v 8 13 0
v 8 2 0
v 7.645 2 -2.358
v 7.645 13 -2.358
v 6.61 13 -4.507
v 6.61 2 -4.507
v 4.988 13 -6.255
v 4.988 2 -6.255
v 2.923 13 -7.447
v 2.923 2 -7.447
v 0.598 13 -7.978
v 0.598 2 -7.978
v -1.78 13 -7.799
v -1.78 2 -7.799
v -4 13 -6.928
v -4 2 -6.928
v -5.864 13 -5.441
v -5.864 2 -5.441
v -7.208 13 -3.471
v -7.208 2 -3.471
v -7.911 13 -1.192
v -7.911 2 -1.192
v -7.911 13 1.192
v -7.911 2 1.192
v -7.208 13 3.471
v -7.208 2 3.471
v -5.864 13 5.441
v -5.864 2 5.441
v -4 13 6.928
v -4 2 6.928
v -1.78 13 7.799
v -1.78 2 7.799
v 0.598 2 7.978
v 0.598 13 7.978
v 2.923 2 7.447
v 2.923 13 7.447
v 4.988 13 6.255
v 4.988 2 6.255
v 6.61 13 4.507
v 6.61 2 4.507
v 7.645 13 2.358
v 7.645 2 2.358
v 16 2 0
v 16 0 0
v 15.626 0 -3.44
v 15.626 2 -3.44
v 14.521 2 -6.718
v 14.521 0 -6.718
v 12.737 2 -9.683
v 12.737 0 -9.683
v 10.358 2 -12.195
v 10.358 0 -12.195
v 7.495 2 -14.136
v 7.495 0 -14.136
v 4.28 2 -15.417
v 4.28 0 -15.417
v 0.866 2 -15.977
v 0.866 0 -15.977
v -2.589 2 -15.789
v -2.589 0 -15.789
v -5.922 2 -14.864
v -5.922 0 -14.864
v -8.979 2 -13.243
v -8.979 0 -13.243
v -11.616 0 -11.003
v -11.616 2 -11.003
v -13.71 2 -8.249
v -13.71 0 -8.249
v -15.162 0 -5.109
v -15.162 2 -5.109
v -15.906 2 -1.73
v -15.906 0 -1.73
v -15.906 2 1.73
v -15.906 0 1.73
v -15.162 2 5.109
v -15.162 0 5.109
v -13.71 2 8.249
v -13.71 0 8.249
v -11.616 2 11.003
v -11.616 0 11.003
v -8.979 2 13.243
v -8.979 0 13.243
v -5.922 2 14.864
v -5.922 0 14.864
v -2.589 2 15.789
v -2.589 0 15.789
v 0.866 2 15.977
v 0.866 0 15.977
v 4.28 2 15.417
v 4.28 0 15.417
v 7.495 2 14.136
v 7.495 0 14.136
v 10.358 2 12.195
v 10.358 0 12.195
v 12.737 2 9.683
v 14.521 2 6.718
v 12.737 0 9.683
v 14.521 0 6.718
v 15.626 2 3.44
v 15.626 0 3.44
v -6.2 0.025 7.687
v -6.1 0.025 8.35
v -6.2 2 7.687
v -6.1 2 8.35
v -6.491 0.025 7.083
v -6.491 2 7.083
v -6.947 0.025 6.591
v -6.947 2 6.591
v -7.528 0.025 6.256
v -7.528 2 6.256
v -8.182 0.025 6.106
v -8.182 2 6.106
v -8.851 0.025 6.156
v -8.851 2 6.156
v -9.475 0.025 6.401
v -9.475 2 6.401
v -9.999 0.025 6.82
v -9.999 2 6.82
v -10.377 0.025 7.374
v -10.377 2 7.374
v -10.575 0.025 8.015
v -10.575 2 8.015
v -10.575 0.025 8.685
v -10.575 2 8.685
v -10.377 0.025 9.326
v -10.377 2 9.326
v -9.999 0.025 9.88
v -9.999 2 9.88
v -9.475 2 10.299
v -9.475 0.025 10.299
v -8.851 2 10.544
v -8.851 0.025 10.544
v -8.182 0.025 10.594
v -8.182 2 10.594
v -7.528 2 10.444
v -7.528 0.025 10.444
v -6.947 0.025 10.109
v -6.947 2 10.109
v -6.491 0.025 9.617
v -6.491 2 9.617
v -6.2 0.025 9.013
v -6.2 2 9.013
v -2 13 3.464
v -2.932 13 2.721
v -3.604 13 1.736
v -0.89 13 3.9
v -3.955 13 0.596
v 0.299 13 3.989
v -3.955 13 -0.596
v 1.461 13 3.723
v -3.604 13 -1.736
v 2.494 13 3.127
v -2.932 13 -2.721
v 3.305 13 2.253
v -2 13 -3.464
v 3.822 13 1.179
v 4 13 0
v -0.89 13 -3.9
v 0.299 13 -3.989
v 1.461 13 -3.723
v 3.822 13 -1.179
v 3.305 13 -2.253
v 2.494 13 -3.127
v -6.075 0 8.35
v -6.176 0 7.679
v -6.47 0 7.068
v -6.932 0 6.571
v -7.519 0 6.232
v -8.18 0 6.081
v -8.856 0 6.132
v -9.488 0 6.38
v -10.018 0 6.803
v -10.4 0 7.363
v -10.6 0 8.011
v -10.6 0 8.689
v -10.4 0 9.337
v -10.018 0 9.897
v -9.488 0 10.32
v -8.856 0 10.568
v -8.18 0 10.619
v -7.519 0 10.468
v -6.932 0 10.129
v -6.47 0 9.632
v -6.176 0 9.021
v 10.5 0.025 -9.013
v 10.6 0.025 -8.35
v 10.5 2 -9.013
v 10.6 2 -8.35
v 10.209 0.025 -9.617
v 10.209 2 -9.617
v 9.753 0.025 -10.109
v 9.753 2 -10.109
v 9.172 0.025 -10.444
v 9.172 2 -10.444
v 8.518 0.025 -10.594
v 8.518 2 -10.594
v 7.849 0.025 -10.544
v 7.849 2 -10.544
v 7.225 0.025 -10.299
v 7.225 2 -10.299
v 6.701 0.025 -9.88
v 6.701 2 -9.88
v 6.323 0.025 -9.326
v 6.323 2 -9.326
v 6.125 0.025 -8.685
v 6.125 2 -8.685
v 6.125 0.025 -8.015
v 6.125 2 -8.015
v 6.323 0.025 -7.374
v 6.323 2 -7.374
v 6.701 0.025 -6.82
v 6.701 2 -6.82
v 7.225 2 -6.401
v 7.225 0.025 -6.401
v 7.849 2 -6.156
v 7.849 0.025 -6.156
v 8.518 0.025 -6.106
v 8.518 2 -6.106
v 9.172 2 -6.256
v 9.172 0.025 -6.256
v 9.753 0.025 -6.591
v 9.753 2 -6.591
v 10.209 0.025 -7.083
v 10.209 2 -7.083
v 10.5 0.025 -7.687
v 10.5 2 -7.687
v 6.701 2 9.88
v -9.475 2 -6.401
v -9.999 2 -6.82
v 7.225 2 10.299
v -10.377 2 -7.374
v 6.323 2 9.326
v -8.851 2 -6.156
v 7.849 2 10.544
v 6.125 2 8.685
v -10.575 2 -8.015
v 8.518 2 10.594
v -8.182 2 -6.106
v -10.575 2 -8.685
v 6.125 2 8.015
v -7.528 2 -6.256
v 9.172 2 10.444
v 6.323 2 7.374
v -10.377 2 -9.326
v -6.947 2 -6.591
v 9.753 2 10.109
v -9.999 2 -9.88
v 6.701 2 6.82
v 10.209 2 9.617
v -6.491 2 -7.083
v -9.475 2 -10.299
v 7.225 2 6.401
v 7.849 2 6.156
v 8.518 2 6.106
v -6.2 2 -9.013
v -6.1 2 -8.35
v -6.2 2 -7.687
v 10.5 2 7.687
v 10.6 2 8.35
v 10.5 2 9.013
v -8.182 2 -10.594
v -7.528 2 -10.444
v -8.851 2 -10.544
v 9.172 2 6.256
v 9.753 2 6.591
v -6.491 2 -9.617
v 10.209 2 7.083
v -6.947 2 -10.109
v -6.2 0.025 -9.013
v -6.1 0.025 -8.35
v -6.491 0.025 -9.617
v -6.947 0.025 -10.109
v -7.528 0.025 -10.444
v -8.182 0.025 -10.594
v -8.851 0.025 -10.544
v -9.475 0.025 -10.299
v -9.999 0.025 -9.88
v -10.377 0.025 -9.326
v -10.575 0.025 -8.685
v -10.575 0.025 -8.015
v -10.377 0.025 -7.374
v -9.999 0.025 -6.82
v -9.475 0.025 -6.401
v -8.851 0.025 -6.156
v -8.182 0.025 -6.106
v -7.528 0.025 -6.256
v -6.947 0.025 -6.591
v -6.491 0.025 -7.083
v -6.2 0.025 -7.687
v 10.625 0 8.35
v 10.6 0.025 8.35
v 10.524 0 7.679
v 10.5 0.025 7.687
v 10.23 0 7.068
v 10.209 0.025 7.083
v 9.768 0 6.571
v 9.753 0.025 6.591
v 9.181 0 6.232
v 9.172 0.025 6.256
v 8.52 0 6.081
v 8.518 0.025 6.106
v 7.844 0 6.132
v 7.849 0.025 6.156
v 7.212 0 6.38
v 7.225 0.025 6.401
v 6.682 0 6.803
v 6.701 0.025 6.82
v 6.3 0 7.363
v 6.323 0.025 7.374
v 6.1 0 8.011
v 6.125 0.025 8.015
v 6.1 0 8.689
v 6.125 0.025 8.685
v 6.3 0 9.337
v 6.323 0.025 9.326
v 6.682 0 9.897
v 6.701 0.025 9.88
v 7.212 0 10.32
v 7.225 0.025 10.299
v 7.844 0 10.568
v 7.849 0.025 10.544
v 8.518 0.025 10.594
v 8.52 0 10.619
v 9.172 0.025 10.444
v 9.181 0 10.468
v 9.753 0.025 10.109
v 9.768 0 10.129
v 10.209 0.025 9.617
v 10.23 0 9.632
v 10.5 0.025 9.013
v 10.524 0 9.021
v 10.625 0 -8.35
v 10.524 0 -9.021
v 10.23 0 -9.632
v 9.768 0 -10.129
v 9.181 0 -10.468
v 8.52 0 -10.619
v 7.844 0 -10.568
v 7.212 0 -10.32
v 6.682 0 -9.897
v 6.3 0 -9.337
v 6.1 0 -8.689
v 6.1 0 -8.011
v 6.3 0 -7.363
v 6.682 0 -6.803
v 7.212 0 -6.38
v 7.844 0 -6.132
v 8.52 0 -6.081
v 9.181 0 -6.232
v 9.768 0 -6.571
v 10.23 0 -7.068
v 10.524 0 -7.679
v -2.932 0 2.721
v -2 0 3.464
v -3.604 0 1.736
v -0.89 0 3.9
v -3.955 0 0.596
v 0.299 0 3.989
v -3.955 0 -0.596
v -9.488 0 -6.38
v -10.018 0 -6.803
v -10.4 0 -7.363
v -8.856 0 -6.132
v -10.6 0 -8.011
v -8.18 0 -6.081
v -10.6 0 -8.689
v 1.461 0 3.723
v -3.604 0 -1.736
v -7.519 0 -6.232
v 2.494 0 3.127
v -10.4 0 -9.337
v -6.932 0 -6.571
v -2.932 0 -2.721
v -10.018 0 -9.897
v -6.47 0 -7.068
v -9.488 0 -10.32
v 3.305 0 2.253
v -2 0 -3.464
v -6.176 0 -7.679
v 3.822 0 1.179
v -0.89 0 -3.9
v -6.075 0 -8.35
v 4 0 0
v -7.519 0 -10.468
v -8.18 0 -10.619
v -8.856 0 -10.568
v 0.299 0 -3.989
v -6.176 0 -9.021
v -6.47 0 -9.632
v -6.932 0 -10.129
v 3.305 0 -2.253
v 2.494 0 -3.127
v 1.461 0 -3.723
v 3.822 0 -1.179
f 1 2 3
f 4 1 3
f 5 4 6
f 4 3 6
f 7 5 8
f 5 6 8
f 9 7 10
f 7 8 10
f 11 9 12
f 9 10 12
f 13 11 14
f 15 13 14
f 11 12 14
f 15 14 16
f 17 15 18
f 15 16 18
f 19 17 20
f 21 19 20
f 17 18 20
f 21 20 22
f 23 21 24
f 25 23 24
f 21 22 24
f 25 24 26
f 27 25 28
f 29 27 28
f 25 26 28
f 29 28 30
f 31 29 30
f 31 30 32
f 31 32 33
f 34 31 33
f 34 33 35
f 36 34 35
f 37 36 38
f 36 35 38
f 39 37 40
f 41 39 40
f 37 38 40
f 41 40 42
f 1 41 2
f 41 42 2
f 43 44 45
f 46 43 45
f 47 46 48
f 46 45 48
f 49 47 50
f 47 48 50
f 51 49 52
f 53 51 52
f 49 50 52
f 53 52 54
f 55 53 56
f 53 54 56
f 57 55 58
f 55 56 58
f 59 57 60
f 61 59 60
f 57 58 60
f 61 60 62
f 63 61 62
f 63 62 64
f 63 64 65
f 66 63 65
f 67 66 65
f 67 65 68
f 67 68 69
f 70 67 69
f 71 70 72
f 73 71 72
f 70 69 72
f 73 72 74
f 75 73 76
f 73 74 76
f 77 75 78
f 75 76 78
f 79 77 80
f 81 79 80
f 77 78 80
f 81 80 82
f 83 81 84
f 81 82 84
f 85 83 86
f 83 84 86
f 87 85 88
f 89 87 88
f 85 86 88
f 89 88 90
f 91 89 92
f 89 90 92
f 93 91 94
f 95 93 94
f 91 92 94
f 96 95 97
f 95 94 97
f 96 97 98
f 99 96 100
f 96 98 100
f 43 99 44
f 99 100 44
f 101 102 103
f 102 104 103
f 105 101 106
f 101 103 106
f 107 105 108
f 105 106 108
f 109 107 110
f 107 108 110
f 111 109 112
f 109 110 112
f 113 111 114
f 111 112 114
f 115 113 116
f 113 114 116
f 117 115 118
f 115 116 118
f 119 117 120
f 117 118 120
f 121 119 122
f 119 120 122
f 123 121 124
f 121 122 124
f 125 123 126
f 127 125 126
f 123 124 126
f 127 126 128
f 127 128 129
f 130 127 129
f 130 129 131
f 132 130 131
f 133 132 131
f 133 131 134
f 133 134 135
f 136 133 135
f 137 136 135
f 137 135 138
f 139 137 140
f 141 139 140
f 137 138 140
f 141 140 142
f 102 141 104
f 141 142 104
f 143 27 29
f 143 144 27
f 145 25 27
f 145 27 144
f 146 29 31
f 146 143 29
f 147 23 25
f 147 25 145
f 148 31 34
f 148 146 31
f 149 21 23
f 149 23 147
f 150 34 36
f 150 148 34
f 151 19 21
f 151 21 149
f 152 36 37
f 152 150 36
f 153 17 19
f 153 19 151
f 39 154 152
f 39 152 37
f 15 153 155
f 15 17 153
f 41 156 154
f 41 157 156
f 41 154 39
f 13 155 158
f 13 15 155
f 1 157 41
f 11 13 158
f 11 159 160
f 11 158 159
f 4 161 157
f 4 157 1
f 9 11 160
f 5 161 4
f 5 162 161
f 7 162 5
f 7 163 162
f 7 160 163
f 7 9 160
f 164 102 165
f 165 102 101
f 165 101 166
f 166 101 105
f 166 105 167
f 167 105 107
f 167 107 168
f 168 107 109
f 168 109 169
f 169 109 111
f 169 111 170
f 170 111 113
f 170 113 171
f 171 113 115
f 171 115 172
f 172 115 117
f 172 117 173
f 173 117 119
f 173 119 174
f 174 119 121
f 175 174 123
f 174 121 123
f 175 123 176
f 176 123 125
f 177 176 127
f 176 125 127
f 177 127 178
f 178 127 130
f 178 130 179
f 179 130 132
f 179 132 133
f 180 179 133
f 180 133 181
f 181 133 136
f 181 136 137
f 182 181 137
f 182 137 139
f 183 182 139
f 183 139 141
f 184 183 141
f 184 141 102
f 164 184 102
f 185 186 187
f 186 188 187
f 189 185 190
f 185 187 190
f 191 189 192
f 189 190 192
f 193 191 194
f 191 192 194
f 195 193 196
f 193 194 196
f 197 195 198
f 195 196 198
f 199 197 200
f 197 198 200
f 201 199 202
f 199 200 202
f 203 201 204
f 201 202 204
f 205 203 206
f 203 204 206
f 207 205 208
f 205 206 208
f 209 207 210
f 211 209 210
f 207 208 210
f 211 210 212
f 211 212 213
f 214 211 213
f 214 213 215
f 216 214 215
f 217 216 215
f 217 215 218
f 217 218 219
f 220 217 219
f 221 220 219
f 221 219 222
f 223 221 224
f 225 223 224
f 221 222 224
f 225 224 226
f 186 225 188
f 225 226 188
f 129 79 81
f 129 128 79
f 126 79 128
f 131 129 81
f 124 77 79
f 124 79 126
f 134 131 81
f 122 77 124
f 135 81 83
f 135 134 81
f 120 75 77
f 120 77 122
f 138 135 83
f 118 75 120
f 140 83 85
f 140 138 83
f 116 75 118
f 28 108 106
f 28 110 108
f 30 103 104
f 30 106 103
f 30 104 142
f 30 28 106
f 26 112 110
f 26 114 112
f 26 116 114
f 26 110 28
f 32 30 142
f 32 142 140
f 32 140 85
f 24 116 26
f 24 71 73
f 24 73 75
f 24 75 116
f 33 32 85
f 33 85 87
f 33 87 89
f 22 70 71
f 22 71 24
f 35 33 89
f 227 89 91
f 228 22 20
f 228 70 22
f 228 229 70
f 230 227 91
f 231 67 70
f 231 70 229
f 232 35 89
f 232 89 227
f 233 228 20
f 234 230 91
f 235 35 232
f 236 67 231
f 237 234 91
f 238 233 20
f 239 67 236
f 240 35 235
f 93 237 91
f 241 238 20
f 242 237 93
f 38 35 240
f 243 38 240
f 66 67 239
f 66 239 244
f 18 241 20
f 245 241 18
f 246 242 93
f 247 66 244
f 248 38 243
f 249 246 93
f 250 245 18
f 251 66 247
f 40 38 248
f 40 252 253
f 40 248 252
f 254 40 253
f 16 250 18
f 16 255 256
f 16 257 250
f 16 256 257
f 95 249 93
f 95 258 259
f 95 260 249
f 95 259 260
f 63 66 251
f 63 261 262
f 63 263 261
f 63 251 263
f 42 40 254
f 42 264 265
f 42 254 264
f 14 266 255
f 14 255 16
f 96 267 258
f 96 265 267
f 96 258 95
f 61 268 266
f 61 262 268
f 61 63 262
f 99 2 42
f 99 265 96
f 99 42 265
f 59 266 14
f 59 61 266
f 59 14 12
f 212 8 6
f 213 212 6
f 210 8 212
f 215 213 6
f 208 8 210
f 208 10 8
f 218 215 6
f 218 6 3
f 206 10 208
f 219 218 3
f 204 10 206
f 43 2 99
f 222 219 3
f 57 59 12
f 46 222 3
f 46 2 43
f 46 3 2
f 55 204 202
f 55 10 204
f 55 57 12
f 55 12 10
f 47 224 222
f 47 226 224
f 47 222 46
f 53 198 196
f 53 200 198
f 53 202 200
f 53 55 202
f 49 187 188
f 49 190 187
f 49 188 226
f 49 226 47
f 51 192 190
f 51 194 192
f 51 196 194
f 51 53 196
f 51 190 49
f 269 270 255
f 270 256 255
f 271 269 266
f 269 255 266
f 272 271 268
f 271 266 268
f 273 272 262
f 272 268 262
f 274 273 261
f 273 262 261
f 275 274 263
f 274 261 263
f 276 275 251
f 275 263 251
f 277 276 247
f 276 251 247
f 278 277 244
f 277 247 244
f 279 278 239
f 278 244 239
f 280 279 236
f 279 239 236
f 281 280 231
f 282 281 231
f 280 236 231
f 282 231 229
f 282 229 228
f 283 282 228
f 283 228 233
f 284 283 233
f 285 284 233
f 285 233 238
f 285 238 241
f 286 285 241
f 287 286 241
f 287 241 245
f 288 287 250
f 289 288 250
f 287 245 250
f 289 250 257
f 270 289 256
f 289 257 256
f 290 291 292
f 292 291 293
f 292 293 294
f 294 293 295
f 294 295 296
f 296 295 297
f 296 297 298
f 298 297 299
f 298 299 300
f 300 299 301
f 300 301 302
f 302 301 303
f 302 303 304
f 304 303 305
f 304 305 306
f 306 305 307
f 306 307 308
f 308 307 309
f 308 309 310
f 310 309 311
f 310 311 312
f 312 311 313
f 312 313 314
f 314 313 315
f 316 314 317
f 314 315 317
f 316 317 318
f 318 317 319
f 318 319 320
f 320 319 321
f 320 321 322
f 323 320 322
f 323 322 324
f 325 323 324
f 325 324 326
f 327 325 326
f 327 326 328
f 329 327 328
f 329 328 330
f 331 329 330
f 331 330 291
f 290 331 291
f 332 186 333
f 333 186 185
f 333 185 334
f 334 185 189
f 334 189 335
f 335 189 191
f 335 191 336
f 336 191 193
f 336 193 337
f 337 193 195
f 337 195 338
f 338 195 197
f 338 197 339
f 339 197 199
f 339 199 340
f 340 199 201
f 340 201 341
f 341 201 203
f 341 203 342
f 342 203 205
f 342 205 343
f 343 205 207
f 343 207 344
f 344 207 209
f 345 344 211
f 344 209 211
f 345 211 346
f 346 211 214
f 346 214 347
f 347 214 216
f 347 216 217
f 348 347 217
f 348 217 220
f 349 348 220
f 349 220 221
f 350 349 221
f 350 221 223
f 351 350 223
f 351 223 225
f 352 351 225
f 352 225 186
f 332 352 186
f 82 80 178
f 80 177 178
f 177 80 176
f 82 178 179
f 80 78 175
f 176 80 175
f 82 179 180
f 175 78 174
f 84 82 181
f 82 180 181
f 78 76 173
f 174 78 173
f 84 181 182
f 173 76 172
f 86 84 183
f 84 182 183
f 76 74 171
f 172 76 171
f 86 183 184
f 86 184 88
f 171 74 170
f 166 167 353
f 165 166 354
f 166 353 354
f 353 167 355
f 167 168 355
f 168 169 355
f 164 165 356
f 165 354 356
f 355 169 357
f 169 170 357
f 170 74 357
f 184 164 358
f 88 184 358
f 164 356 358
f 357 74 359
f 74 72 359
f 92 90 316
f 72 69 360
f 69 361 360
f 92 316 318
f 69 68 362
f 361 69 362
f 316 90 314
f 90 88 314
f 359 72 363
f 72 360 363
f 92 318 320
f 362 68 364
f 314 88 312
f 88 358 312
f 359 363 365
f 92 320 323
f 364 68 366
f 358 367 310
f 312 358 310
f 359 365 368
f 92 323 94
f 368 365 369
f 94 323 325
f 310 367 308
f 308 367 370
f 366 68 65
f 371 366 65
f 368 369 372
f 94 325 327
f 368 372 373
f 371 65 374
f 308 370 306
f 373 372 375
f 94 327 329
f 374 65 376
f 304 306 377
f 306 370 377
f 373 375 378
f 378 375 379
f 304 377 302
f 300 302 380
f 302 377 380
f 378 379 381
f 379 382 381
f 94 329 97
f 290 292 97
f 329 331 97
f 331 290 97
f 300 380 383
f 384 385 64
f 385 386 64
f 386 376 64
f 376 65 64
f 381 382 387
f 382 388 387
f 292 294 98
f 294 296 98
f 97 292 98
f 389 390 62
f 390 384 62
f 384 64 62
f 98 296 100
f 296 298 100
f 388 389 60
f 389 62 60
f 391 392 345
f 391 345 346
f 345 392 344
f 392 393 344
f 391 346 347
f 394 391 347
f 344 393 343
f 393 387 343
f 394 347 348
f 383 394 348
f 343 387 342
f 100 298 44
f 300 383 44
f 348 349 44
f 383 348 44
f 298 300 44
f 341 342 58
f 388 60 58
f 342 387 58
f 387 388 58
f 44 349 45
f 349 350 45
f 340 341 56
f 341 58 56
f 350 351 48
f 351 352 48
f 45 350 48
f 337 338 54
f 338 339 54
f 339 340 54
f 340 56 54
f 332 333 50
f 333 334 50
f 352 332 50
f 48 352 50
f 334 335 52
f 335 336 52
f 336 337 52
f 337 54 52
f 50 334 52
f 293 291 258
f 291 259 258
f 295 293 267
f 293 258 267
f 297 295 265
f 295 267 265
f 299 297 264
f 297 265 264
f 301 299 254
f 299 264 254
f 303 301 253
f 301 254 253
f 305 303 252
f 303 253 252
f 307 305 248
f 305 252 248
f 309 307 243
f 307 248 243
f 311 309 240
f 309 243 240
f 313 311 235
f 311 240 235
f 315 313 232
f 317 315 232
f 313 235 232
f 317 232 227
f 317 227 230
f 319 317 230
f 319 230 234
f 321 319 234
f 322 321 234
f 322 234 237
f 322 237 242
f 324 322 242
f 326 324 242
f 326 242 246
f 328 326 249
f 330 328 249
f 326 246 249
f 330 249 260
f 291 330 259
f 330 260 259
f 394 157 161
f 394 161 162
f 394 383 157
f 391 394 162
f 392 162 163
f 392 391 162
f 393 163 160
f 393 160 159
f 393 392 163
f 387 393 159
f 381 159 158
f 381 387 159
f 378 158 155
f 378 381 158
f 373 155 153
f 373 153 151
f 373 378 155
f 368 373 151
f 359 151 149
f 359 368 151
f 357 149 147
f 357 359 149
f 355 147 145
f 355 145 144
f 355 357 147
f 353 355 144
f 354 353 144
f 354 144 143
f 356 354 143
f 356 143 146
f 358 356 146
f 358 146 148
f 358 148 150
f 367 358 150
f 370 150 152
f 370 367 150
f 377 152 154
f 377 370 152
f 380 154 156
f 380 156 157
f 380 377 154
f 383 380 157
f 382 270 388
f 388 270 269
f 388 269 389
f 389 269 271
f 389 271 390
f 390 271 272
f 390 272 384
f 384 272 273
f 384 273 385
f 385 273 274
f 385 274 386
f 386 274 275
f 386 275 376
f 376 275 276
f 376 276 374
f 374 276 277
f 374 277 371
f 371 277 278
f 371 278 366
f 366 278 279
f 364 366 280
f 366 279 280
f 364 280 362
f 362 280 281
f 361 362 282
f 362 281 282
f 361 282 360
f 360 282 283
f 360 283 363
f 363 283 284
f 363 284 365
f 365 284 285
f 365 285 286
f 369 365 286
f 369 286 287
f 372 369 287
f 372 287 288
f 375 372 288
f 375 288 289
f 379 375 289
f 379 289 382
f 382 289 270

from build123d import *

# Parameters (mm, degrees)
SKETCH1_R                      = 16
SKETCH1_R_2                    = 4
BOSS_EXTRUDE1_DEPTH            = 2
SKETCH2_R                      = 8
SKETCH2_R_2                    = 4
BOSS_EXTRUDE2_DEPTH            = 11
M4_CLEARANCE_HOLE1_D           = 4.5
M4_CLEARANCE_HOLE1_DEPTH       = 13
M4_CLEARANCE_HOLE1_CSINK_D     = 4.55
M4_CLEARANCE_HOLE1_CSINK_ANGLE = 90
M4_CLEARANCE_HOLE1_TIP         = 1.351936393


with BuildPart() as part:
    # Sketch1 → Boss-Extrude1 (new body)
    with BuildSketch(Plane(origin=(0, 0, 0), x_dir=(1, 0, 0), z_dir=(0, 1, 0))):
        Circle(SKETCH1_R)
        Circle(SKETCH1_R_2, mode=Mode.SUBTRACT)
    extrude(amount=BOSS_EXTRUDE1_DEPTH)

    # Sketch2 → Boss-Extrude2 (add)
    with BuildSketch(Plane(origin=(0, 2, 0), x_dir=(1, 0, 0), z_dir=(0, 1, 0))):
        Circle(SKETCH2_R)
        Circle(SKETCH2_R_2, mode=Mode.SUBTRACT)
    extrude(amount=BOSS_EXTRUDE2_DEPTH)

    # M4 Clearance Hole1
    with Locations(Plane(origin=(0, 0, 0), x_dir=(-1, 0, 0), z_dir=(0, -1, 0))):
        with Locations((-8.35, 8.35), (8.35, 8.35), (8.35, -8.35), (-8.35, -8.35)):
            CounterSinkHole(M4_CLEARANCE_HOLE1_D / 2, M4_CLEARANCE_HOLE1_CSINK_D / 2, depth=M4_CLEARANCE_HOLE1_DEPTH, counter_sink_angle=M4_CLEARANCE_HOLE1_CSINK_ANGLE)
            with Locations((0, 0, -(M4_CLEARANCE_HOLE1_DEPTH + M4_CLEARANCE_HOLE1_TIP / 2))):  # 118° drill point
                Cone(0, M4_CLEARANCE_HOLE1_D / 2, M4_CLEARANCE_HOLE1_TIP, mode=Mode.SUBTRACT)


solid = part.part
